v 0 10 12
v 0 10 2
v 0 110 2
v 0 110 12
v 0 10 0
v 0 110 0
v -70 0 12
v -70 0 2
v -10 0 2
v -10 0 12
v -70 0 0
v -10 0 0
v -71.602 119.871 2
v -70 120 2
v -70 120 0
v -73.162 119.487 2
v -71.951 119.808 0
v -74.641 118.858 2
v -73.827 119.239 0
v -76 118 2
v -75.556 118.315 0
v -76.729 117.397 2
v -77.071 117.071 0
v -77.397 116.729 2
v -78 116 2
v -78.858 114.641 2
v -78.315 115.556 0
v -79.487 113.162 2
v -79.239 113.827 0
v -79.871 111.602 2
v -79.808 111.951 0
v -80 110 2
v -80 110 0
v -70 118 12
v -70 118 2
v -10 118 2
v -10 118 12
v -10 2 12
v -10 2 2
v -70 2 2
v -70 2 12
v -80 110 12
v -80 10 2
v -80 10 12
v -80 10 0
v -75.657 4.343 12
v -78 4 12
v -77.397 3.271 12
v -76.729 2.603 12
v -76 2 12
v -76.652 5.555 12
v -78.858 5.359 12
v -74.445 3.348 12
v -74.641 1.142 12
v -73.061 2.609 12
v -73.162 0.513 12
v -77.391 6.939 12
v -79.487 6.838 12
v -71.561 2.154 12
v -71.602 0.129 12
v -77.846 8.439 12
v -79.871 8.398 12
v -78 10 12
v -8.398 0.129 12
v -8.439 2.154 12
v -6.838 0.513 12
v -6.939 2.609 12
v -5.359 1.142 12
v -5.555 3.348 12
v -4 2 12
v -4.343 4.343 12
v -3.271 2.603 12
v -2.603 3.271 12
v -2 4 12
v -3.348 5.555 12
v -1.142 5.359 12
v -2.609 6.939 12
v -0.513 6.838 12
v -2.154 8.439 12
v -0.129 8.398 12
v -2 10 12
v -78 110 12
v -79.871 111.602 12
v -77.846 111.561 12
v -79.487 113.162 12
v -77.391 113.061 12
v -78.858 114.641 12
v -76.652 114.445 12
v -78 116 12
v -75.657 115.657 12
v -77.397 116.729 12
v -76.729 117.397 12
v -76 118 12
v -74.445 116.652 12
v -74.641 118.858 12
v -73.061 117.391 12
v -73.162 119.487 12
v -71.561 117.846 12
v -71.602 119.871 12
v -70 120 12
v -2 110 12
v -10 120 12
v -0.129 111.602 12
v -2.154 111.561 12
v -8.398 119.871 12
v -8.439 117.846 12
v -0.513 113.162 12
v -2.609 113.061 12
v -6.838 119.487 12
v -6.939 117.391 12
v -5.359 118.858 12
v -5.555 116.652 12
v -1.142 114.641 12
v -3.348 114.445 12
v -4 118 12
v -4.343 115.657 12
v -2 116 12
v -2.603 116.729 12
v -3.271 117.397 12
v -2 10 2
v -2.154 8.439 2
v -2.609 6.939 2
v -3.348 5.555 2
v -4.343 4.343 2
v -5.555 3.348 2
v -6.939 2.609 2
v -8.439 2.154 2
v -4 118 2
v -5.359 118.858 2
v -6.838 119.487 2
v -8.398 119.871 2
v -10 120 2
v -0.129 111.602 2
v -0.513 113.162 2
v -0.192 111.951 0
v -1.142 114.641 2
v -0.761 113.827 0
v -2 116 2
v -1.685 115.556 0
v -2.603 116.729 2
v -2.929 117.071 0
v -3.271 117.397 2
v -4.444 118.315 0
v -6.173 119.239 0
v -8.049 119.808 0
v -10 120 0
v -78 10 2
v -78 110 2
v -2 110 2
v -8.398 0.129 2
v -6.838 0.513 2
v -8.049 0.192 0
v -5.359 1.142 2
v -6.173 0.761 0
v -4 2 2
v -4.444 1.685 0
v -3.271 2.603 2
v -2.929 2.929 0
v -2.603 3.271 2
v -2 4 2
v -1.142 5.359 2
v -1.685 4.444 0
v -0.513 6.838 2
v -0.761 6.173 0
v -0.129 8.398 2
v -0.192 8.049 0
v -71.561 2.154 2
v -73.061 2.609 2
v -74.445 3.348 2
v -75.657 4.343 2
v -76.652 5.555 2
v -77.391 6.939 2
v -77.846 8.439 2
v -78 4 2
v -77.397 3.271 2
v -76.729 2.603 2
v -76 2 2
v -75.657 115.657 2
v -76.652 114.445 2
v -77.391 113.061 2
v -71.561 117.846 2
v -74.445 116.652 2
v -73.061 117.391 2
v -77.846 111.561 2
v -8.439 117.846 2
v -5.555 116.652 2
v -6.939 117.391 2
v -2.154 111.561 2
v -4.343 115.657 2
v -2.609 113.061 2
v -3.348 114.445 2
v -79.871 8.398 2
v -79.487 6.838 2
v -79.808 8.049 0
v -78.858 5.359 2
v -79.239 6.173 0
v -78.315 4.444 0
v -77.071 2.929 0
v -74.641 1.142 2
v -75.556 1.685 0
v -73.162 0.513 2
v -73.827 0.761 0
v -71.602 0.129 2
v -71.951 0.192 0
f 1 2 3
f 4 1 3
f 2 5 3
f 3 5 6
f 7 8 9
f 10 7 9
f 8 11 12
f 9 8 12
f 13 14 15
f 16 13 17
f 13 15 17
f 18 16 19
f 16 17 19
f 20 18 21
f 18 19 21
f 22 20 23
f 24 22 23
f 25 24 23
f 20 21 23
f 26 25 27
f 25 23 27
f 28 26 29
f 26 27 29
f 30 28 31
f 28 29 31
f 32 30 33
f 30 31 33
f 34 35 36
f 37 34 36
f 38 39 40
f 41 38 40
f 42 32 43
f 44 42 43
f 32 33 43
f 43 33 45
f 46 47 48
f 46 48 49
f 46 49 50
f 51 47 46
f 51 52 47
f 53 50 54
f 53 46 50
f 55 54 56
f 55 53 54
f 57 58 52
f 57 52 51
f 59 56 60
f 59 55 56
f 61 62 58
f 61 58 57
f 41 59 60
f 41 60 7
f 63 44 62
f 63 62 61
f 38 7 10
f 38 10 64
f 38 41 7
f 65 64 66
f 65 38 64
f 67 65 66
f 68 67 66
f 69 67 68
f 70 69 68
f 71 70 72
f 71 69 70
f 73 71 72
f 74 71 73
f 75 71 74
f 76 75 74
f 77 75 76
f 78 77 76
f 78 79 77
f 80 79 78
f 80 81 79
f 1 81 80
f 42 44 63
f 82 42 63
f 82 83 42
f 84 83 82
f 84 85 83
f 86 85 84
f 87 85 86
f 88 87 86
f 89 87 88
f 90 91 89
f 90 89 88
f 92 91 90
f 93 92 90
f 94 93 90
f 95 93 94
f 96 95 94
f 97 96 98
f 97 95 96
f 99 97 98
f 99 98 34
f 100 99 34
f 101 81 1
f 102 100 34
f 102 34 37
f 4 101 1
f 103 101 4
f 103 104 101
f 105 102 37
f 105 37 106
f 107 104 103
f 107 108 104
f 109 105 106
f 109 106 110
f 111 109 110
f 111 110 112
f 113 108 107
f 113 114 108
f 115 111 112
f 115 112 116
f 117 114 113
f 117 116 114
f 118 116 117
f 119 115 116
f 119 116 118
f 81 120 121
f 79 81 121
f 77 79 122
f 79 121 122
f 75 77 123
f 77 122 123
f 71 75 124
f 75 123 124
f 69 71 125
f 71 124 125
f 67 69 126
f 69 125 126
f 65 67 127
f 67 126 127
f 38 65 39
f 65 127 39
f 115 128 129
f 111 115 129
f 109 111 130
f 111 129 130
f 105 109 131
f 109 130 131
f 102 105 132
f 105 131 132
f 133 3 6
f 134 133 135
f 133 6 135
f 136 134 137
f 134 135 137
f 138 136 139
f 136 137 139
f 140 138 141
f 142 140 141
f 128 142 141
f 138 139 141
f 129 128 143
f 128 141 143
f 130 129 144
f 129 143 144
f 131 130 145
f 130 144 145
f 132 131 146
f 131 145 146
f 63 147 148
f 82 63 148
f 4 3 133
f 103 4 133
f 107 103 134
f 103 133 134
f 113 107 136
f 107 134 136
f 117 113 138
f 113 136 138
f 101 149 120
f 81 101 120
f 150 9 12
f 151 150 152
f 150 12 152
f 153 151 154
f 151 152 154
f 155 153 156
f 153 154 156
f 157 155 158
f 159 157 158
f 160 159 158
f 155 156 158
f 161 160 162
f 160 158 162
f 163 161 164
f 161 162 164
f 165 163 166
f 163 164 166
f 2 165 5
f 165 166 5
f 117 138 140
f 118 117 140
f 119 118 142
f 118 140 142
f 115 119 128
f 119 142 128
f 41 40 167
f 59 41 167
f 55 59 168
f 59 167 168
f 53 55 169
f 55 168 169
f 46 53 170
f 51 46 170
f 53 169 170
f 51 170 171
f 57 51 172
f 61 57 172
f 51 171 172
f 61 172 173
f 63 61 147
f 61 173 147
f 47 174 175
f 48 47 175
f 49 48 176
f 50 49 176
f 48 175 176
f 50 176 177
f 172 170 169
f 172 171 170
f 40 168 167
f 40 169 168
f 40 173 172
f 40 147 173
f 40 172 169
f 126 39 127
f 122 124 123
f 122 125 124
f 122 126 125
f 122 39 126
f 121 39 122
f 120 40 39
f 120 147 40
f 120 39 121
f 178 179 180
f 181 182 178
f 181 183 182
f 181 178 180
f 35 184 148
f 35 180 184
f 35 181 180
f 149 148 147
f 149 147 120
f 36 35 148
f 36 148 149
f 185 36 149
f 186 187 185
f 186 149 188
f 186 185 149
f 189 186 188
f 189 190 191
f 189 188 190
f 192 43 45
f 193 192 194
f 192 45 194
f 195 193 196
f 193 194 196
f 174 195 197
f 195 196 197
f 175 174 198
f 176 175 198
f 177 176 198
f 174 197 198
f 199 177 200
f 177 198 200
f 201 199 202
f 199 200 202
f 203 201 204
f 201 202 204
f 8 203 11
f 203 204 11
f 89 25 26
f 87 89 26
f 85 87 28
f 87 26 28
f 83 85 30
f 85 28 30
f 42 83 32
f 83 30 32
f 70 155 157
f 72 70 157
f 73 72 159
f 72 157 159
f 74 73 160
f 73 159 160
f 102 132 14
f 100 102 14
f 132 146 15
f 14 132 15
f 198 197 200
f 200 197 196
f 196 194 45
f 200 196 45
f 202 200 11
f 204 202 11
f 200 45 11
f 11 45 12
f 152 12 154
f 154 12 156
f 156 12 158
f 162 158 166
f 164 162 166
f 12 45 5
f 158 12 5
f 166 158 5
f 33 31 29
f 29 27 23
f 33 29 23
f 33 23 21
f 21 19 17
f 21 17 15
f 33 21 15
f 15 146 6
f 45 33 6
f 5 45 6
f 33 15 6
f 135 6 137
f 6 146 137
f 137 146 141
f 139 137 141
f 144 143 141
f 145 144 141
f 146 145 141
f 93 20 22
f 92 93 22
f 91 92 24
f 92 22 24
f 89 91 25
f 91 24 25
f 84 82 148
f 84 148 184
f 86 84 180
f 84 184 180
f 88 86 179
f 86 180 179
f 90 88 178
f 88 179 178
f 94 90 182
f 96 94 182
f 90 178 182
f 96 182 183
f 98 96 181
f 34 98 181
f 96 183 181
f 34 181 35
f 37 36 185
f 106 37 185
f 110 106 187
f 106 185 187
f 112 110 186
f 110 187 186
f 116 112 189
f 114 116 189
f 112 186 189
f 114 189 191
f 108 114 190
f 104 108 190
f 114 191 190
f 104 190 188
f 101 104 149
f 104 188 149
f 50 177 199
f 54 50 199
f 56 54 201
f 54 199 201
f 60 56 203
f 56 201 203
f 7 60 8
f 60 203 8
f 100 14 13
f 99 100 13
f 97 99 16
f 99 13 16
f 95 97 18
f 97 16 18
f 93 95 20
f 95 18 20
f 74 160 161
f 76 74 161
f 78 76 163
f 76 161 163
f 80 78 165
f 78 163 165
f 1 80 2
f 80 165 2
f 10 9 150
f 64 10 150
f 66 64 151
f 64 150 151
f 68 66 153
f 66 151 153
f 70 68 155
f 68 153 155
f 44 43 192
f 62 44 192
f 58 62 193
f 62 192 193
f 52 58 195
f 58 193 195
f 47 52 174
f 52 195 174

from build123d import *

# Parameters (mm, degrees)
BOSS_EXTRU_3_DEPTH = 2
BOSS_EXTRU_4_DEPTH = 10


with BuildPart() as part:
    # Esquisse1 → Boss.-Extru.3 (new body)
    with BuildSketch(Plane.XY):
        with BuildLine():
            Line((-70, 0), (-10.000000065, 0))
            ThreePointArc((-10.000000065, 0), (-2.928932211, 2.928932165), (0, 10))
            Line((0, 10), (0, 110))
            ThreePointArc((0, 110), (-2.928932188, 117.071067812), (-10, 120))
            Line((-10, 120), (-70, 120))
            ThreePointArc((-70, 120), (-77.071067812, 117.071067812), (-80, 110))
            Line((-80, 110), (-80, 10))
            ThreePointArc((-80, 10), (-77.071067812, 2.928932188), (-70, 0))
        make_face()
    extrude(amount=BOSS_EXTRU_3_DEPTH)

    # Esquisse3 → Boss.-Extru.4 (add)
    with BuildSketch(Plane.XY.offset(2)):
        with BuildLine():
            ThreePointArc((-80, 10), (-79.486832981, 6.83772234), (-78, 4))
            Line((-78, 4), (-78, 10))
            Line((-78, 10), (-78, 16))
            ThreePointArc((-78, 16), (-79.486832981, 13.16227766), (-80, 10))
        make_face()
        with BuildLine():
            ThreePointArc((-78, 4), (-77.071067812, 2.928932188), (-76, 2))
            Line((-76, 2), (-70, 2))
            ThreePointArc((-70, 2), (-75.656854249, 4.343145751), (-78, 10))
            Line((-78, 10), (-78, 4))
        make_face()
        with BuildLine():
            ThreePointArc((-76, 2), (-73.16227766, 0.513167019), (-70, 0))
            ThreePointArc((-70, 0), (-66.83772234, 0.513167019), (-64, 2))
            Line((-64, 2), (-70, 2))
            Line((-70, 2), (-76, 2))
        make_face()
        with BuildLine():
            Line((-70, 0), (-10, 0))
            ThreePointArc((-10, 0), (-13.16227766, 0.513167019), (-16, 2))
            Line((-16, 2), (-64, 2))
            ThreePointArc((-64, 2), (-66.83772234, 0.513167019), (-70, 0))
        make_face()
        with BuildLine():
            ThreePointArc((-80, 10), (-79.486832981, 13.16227766), (-78, 16))
            Line((-78, 16), (-78, 104))
            ThreePointArc((-78, 104), (-79.486832981, 106.83772234), (-80, 110))
            Line((-80, 110), (-80, 10))
        make_face()
        with BuildLine():
            ThreePointArc((-80, 110), (-79.486832981, 106.83772234), (-78, 104))
            Line((-78, 104), (-78, 110))
            Line((-78, 110), (-78, 116))
            ThreePointArc((-78, 116), (-79.486832981, 113.16227766), (-80, 110))
        make_face()
        with BuildLine():
            ThreePointArc((-78, 110), (-75.656854249, 115.656854249), (-70, 118))
            Line((-70, 118), (-76, 118))
            ThreePointArc((-76, 118), (-77.071067812, 117.071067812), (-78, 116))
            Line((-78, 116), (-78, 110))
        make_face()
        with BuildLine():
            Line((-70, 118), (-64, 118))
            ThreePointArc((-64, 118), (-66.83772234, 119.486832981), (-70, 120))
            ThreePointArc((-70, 120), (-73.16227766, 119.486832981), (-76, 118))
            Line((-76, 118), (-70, 118))
        make_face()
        with BuildLine():
            Line((-64, 118), (-16, 118))
            ThreePointArc((-16, 118), (-13.16227766, 119.486832981), (-10, 120))
            Line((-10, 120), (-70, 120))
            ThreePointArc((-70, 120), (-66.83772234, 119.486832981), (-64, 118))
        make_face()
        with BuildLine():
            ThreePointArc((-10, 120), (-13.16227766, 119.486832981), (-16, 118))
            Line((-16, 118), (-10, 118))
            Line((-10, 118), (-4, 118))
            ThreePointArc((-4, 118), (-6.83772234, 119.486832981), (-10, 120))
        make_face()
        with BuildLine():
            Line((-2, 110), (-2, 116))
            ThreePointArc((-2, 116), (-2.928932188, 117.071067812), (-4, 118))
            Line((-4, 118), (-10, 118))
            ThreePointArc((-10, 118), (-4.343145751, 115.656854249), (-2, 110))
        make_face()
        with BuildLine():
            ThreePointArc((-2, 104), (-0.513167019, 106.83772234), (0, 110))
            ThreePointArc((0, 110), (-0.513167019, 113.16227766), (-2, 116))
            Line((-2, 116), (-2, 110))
            Line((-2, 110), (-2, 104))
        make_face()
        with BuildLine():
            ThreePointArc((-2, 16), (-0.513167019, 13.16227766), (0, 10))
            Line((0, 10), (0, 110))
            ThreePointArc((0, 110), (-0.513167019, 106.83772234), (-2, 104))
            Line((-2, 104), (-2, 16))
        make_face()
        with BuildLine():
            Line((-2, 10), (-2, 4))
            ThreePointArc((-2, 4), (-0.513167019, 6.83772234), (0, 10))
            ThreePointArc((0, 10), (-0.513167019, 13.16227766), (-2, 16))
            Line((-2, 16), (-2, 10))
        make_face()
        with BuildLine():
            Line((-10, 2), (-4, 2))
            ThreePointArc((-4, 2), (-2.928932188, 2.928932188), (-2, 4))
            Line((-2, 4), (-2, 10))
            ThreePointArc((-2, 10), (-4.343145751, 4.343145751), (-10, 2))
        make_face()
        with BuildLine():
            ThreePointArc((-10, 0), (-6.83772234, 0.513167019), (-4, 2))
            Line((-4, 2), (-10, 2))
            Line((-10, 2), (-16, 2))
            ThreePointArc((-16, 2), (-13.16227766, 0.513167019), (-10, 0))
        make_face()
    extrude(amount=BOSS_EXTRU_4_DEPTH)


solid = part.part
